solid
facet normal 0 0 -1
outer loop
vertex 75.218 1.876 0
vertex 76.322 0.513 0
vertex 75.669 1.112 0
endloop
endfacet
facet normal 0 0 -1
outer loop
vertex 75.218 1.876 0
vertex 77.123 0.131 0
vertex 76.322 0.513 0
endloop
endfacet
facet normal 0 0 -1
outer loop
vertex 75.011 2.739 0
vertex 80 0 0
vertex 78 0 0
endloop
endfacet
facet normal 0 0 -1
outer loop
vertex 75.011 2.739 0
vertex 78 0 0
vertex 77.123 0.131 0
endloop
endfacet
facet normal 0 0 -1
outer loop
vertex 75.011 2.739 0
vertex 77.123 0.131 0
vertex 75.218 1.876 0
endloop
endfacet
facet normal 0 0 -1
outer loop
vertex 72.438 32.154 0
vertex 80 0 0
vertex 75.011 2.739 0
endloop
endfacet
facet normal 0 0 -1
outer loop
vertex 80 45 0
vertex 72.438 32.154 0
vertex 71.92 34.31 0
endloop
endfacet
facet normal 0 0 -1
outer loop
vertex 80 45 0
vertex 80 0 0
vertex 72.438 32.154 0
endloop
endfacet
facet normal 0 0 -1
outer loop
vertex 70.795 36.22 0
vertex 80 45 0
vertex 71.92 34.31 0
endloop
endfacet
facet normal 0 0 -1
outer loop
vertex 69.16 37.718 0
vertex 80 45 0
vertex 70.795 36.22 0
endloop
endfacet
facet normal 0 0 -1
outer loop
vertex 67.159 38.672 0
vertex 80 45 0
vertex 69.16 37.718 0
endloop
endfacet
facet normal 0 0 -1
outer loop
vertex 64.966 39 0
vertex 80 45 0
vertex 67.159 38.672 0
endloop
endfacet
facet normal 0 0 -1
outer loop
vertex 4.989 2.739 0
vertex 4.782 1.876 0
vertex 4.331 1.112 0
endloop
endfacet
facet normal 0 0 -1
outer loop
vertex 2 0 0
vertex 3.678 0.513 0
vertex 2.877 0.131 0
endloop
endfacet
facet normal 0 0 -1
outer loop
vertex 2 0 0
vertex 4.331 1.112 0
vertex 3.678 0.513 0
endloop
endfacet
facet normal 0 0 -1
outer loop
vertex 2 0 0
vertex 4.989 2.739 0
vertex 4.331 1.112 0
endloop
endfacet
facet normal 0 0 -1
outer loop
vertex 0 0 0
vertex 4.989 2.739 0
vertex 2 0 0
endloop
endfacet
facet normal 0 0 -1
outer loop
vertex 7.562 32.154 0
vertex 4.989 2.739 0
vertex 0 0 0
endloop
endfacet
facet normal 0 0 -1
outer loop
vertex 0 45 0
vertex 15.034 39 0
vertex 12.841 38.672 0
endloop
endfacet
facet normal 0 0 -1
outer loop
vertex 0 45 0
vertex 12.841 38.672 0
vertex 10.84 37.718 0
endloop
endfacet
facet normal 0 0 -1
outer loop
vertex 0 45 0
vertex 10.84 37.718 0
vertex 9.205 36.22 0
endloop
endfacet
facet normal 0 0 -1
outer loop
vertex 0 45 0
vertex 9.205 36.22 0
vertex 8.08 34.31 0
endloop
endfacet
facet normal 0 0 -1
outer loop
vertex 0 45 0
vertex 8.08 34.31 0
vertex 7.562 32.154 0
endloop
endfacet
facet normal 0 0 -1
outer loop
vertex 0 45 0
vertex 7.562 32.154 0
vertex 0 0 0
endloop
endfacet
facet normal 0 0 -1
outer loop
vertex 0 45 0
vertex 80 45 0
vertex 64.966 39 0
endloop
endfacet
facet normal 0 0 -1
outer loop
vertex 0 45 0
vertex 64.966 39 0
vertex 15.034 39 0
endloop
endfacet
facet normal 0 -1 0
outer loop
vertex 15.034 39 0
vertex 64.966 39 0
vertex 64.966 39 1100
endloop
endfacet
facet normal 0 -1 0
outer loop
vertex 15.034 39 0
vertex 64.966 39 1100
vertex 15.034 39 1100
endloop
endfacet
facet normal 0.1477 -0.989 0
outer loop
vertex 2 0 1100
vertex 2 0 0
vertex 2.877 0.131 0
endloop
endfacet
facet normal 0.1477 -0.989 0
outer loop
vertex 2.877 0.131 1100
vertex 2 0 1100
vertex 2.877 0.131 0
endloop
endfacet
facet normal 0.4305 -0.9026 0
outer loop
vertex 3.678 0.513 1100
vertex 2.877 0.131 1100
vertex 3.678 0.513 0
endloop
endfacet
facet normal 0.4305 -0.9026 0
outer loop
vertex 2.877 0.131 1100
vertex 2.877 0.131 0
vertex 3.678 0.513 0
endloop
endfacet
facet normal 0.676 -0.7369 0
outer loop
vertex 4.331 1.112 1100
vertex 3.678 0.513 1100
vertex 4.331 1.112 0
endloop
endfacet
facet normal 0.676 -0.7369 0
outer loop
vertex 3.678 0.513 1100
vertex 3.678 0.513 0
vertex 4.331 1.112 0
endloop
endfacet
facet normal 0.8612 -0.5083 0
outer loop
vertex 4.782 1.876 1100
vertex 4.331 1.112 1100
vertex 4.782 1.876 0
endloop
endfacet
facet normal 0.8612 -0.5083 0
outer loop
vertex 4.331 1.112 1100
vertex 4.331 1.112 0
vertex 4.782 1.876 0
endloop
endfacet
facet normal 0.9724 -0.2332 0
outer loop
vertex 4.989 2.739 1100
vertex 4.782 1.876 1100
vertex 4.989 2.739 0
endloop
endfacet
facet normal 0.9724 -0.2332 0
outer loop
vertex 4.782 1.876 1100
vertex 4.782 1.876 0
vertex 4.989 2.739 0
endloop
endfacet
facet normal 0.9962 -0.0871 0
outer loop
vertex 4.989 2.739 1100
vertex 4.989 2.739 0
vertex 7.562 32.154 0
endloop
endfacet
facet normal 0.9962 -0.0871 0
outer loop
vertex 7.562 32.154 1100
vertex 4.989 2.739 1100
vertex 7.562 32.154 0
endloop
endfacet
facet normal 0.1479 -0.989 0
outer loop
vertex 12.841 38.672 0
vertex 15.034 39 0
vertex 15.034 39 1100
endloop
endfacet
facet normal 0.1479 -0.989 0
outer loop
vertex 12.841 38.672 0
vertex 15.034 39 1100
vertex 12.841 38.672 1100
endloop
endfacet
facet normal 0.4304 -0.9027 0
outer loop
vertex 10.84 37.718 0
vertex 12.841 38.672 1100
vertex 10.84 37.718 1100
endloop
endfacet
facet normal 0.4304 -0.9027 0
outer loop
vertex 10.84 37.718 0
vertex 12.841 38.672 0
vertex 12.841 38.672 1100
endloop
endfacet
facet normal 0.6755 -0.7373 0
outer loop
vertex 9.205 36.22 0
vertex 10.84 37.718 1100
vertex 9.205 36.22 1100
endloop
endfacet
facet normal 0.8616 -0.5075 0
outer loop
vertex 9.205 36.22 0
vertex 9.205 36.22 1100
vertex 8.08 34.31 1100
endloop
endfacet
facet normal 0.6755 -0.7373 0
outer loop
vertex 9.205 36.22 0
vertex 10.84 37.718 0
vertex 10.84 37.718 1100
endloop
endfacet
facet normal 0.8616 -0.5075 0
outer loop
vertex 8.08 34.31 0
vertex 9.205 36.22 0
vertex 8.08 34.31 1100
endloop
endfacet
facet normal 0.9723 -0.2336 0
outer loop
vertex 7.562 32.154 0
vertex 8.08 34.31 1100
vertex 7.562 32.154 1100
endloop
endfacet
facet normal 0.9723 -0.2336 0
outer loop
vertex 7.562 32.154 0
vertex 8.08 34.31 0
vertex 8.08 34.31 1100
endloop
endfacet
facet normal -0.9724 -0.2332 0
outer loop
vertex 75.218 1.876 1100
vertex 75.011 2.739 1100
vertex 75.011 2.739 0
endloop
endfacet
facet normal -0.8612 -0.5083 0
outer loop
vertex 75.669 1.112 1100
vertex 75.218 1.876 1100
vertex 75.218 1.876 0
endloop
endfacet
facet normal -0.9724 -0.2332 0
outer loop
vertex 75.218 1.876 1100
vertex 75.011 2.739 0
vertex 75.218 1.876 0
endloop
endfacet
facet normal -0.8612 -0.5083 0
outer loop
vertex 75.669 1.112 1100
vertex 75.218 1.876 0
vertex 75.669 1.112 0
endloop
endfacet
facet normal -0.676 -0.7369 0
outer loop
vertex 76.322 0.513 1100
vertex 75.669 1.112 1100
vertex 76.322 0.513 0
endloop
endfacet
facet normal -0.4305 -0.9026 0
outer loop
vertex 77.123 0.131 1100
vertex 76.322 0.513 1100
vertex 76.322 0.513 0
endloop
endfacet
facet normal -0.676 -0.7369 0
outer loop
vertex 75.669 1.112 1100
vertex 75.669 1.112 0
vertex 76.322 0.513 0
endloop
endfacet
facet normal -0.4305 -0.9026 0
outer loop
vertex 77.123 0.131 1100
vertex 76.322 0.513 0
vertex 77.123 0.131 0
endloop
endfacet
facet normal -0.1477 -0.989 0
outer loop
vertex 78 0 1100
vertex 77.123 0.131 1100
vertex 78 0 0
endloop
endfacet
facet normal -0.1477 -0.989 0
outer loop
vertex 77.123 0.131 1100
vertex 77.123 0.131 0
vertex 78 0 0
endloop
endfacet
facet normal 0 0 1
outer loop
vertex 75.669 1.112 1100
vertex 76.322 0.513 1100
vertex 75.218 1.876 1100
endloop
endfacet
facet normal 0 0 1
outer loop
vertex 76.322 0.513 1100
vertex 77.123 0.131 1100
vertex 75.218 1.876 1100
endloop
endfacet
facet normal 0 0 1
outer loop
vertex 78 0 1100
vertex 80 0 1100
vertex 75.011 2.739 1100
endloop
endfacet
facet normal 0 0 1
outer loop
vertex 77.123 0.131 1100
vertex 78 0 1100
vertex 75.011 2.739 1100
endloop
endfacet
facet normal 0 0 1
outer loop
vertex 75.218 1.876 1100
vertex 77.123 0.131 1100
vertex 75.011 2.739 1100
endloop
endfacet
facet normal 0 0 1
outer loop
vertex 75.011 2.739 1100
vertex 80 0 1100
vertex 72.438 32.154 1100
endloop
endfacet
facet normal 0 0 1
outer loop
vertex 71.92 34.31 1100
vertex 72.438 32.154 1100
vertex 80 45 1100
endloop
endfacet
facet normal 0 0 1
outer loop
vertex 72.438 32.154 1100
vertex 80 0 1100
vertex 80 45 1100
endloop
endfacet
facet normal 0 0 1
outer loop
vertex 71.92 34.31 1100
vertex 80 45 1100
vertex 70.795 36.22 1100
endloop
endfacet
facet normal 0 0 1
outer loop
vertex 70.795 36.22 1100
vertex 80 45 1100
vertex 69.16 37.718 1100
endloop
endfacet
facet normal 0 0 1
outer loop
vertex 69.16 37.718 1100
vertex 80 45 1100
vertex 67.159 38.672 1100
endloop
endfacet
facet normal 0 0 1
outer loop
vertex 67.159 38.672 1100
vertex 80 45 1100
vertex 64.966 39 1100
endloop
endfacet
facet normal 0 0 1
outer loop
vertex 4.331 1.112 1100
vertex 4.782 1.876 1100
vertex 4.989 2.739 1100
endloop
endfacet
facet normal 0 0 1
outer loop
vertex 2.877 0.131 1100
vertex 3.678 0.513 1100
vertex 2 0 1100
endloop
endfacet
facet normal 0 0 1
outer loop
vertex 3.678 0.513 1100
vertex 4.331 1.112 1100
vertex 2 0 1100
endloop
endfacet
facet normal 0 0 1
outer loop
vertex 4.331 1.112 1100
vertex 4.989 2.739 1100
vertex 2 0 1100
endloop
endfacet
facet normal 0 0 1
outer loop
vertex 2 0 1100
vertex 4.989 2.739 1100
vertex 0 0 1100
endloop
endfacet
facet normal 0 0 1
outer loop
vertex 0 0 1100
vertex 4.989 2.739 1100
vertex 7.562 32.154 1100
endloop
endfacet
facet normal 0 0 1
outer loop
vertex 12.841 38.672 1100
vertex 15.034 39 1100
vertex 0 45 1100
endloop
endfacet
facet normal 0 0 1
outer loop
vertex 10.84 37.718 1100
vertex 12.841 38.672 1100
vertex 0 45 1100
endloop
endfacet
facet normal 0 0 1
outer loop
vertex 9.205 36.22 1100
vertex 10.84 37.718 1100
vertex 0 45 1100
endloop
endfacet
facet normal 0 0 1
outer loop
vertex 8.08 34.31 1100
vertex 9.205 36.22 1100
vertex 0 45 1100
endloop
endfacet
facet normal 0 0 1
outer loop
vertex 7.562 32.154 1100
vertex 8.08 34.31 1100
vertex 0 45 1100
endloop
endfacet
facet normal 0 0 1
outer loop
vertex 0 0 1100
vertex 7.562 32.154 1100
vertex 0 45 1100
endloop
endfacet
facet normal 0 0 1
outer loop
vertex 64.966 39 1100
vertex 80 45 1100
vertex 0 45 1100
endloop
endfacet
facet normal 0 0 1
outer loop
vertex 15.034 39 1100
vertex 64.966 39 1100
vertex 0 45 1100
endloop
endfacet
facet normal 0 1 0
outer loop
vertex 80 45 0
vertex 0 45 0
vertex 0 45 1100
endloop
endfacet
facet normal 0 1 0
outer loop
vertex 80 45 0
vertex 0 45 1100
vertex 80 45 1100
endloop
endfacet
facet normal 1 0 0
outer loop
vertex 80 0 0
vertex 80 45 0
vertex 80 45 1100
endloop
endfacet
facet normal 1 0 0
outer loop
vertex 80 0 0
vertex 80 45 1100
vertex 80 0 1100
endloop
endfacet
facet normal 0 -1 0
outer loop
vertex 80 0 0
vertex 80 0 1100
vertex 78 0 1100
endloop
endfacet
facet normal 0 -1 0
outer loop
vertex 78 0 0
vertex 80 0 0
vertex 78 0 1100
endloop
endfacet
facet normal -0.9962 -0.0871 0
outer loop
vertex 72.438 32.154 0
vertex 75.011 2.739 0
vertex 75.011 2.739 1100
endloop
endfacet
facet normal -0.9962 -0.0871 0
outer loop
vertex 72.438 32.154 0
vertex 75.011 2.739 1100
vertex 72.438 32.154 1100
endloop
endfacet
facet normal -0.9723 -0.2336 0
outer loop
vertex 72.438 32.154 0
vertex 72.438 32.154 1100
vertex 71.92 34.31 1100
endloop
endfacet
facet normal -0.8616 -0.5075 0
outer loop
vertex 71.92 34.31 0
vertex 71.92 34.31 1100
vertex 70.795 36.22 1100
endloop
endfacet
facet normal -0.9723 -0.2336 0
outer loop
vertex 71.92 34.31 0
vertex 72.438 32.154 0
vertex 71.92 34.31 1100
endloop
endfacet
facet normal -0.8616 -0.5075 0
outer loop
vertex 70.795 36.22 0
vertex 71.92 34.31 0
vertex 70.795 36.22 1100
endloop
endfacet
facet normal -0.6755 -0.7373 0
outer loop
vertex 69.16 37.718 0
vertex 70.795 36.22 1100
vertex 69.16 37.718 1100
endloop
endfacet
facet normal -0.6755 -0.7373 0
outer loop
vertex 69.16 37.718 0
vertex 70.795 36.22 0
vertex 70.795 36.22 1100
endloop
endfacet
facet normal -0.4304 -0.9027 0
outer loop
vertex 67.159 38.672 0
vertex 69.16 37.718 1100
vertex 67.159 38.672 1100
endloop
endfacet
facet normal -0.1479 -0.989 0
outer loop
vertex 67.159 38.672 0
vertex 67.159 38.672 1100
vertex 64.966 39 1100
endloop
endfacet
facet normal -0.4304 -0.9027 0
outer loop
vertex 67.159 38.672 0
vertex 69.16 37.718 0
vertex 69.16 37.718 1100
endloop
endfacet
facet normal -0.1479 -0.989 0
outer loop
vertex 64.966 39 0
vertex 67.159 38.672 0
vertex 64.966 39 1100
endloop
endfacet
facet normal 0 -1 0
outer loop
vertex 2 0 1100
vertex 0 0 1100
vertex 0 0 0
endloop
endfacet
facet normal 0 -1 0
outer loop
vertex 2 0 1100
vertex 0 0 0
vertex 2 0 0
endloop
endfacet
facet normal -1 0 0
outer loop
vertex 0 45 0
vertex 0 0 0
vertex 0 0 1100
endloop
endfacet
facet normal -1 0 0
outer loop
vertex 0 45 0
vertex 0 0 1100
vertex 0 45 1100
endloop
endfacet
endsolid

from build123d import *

# Parameters (mm, degrees)
PAD_DEPTH    = 1100
SKETCH001_R  = 6
POCKET_DEPTH = 80.001


with BuildPart() as part:
    # Sketch → Pad (new body)
    with BuildSketch(Plane.XY):
        with BuildLine():
            Line((0, 0), (0, 45))
            Line((0, 45), (80, 45))
            Line((80, 45), (80, 0))
            Line((80, 0), (78, 0))
            ThreePointArc((75.011416, 2.738533), (75.973229, 0.788168), (78, 0))
            Line((75.011416, 2.738533), (72.437925, 32.153668))
            ThreePointArc((72.437925, 32.153668), (70.033391, 37.02958), (64.966465, 39))
            Line((64.966465, 39), (15.033535, 39))
            ThreePointArc((15.033535, 39), (9.966609, 37.02958), (7.562075, 32.153668))
            Line((4.988584, 2.738533), (7.562075, 32.153668))
            ThreePointArc((2, 0), (4.026771, 0.788168), (4.988584, 2.738533))
            Line((0, 0), (2, 0))
        make_face()
    extrude(amount=PAD_DEPTH)

    # Sketch001 (on Face2 of Pad) → Pocket (cut, through all)
    with BuildSketch(Plane(origin=(0, 0, 0), x_dir=(0, -1, 0), z_dir=(-1, 0, 0))):
        with Locations((-62, 1050)):
            Circle(SKETCH001_R)
    extrude(amount=-POCKET_DEPTH, mode=Mode.SUBTRACT)


solid = part.part
